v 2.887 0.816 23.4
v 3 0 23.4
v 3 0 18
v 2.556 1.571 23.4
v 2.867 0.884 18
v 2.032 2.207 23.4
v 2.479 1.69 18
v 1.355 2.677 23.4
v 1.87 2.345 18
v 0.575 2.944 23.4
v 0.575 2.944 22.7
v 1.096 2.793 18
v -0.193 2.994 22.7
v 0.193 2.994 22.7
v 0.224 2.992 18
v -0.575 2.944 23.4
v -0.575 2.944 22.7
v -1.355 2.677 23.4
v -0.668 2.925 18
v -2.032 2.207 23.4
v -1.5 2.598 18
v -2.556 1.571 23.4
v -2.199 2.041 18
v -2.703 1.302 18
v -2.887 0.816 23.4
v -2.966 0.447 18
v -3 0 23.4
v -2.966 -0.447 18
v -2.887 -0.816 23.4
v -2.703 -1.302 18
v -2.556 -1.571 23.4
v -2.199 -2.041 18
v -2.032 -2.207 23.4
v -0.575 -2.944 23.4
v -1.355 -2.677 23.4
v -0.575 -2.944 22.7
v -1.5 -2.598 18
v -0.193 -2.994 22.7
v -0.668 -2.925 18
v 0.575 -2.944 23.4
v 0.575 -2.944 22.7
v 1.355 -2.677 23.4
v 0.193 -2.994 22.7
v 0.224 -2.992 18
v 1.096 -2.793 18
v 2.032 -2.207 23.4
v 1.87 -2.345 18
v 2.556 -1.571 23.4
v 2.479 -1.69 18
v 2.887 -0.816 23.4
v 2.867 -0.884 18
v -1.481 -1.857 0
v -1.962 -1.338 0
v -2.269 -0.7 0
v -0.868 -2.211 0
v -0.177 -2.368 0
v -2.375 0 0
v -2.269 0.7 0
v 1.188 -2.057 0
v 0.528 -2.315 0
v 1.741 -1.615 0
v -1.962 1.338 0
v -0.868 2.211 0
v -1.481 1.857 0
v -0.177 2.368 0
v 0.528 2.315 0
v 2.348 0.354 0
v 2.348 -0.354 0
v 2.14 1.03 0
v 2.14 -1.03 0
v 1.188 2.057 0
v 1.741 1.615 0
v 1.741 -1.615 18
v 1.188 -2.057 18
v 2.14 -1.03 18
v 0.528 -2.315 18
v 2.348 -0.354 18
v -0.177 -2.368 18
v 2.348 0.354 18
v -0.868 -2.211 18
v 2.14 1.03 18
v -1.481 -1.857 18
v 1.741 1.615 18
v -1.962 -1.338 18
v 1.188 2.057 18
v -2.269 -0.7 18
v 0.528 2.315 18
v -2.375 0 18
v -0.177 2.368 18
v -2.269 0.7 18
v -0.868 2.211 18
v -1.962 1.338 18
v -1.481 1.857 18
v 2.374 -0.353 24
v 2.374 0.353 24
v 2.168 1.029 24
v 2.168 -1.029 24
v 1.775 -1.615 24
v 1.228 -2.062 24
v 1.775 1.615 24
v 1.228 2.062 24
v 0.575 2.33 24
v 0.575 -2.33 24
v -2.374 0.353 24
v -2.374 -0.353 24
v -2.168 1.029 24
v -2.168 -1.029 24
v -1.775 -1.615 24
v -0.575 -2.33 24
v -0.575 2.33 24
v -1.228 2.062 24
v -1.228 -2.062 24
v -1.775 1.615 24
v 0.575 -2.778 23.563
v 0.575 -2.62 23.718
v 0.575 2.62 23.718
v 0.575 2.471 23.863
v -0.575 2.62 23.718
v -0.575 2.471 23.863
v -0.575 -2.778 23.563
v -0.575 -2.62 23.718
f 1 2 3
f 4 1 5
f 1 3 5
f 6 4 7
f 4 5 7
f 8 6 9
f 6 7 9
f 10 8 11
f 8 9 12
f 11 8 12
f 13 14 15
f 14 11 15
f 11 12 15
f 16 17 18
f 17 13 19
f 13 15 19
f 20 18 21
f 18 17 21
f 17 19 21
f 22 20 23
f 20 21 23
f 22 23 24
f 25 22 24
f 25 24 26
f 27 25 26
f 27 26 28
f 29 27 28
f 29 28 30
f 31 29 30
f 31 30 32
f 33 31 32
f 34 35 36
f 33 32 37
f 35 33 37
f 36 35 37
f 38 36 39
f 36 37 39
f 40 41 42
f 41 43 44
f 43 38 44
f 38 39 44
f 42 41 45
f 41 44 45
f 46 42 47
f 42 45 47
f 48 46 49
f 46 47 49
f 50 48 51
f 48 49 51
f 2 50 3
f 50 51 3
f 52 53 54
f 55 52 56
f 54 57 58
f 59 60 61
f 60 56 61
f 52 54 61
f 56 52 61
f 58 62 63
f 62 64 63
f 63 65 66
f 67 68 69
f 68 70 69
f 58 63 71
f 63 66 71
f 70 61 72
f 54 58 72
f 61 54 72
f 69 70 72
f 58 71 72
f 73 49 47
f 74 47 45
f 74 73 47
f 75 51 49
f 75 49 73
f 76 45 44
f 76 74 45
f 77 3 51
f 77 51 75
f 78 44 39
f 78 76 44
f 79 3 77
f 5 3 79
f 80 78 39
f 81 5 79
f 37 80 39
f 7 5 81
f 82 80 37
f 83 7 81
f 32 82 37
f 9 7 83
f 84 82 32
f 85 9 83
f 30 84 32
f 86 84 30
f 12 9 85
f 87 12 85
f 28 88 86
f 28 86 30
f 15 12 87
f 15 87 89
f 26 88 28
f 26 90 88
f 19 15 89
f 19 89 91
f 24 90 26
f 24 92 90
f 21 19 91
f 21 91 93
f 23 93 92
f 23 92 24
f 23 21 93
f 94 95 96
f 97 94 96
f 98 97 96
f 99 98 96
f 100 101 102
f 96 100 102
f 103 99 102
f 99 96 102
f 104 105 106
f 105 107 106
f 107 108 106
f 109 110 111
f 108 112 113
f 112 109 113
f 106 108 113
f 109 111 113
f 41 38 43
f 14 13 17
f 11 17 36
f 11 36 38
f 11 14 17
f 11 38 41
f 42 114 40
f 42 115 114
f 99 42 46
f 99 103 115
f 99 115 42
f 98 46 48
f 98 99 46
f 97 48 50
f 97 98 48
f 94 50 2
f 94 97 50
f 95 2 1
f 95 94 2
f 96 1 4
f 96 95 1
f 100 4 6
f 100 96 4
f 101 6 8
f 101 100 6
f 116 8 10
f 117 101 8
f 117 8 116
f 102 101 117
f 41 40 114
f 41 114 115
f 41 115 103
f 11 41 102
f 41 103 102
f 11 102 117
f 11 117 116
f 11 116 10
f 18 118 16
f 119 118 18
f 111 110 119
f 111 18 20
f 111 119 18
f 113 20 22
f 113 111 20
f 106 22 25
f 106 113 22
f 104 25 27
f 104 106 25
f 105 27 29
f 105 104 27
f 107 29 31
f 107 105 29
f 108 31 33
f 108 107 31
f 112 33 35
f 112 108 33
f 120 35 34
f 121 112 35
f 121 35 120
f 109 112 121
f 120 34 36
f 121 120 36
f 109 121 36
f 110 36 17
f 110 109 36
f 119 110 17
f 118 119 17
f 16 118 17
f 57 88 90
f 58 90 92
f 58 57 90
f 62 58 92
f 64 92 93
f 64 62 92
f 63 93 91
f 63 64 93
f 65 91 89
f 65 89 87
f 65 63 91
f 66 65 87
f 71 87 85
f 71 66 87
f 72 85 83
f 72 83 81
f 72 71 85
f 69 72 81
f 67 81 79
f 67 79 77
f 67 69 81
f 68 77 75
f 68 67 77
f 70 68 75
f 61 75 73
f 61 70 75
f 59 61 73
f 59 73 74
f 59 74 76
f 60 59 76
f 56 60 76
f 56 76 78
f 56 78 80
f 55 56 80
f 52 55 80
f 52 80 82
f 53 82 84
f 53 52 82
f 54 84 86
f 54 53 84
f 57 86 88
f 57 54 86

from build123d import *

# Parameters (mm, degrees)
ESQUISSE3_W             = 3
ESQUISSE3_H             = 24
CHANFREIN1_SIZE         = 0.6
ESQUISSE6_R             = 3.5
ENL_V_MAT_EXTRU_1_DEPTH = 25.505101524
ESQUISSE7_OUTSIDE_W     = 13.092
ESQUISSE7_OUTSIDE_H     = 13.092
ESQUISSE7_OUTSIDE_R     = 2.375
ENL_V_MAT_EXTRU_2_DEPTH = 18
ESQUISSE8_W             = 1.15
ESQUISSE8_H             = 7.450711795
ENL_V_MAT_EXTRU_3_DEPTH = 1.3


with BuildPart() as part:
    # Esquisse1 → Base-Révolution (revolve)
    with BuildSketch(Plane(origin=(0, 0, 0), x_dir=(1, 0, 0), z_dir=(0, 1, 0))):
        with BuildLine():
            Line((0, 0), (3.5, 0))
            Line((3.5, 0), (3.5, 3.6))
            ThreePointArc((3.5, 3.6), (3.382842712, 3.882842712), (3.1, 4))
            Line((3.1, 4), (0, 4))
            Line((0, 4), (0, 0))
        make_face()
    revolve(axis=Axis((0, 0, 0), (0, 0, -1)))

    # Esquisse3 → Boss.-Révol.1 (revolve)
    with BuildSketch(Plane(origin=(0, 0, 0), x_dir=(1, 0, 0), z_dir=(0, 1, 0))):
        with Locations((1.5, -12)):
            Rectangle(ESQUISSE3_W, ESQUISSE3_H)
    revolve(axis=Axis((0, 0, 0), (0, 0, 1)))

    # Chanfrein1
    chanfrein1_edges = [part.edges().sort_by_distance(p)[0] for p in [
        (-3, 0, 24),
    ]]
    chamfer(chanfrein1_edges, length=CHANFREIN1_SIZE)

    # Esquisse6 → Enlèv. mat.-Extru.1 (cut, through all)
    with BuildSketch(Plane.XY):
        Circle(ESQUISSE6_R)
    extrude(amount=-ENL_V_MAT_EXTRU_1_DEPTH, mode=Mode.SUBTRACT)

    # Esquisse7 outside → Enlèv. mat.-Extru.2 (cut)
    with BuildSketch(Plane(origin=(0, 0, 0), x_dir=(-1, 0, 0), z_dir=(0, 0, -1))):
        Rectangle(ESQUISSE7_OUTSIDE_W, ESQUISSE7_OUTSIDE_H)
        Circle(ESQUISSE7_OUTSIDE_R, mode=Mode.SUBTRACT)
    extrude(amount=-ENL_V_MAT_EXTRU_2_DEPTH, mode=Mode.SUBTRACT)

    # Esquisse8 → Enlèv. mat.-Extru.3 (cut)
    with BuildSketch(Plane.XY.offset(24)):
        with Locations((0, -0.141041798)):
            Rectangle(ESQUISSE8_W, ESQUISSE8_H)
    extrude(amount=-ENL_V_MAT_EXTRU_3_DEPTH, mode=Mode.SUBTRACT)


solid = part.part
